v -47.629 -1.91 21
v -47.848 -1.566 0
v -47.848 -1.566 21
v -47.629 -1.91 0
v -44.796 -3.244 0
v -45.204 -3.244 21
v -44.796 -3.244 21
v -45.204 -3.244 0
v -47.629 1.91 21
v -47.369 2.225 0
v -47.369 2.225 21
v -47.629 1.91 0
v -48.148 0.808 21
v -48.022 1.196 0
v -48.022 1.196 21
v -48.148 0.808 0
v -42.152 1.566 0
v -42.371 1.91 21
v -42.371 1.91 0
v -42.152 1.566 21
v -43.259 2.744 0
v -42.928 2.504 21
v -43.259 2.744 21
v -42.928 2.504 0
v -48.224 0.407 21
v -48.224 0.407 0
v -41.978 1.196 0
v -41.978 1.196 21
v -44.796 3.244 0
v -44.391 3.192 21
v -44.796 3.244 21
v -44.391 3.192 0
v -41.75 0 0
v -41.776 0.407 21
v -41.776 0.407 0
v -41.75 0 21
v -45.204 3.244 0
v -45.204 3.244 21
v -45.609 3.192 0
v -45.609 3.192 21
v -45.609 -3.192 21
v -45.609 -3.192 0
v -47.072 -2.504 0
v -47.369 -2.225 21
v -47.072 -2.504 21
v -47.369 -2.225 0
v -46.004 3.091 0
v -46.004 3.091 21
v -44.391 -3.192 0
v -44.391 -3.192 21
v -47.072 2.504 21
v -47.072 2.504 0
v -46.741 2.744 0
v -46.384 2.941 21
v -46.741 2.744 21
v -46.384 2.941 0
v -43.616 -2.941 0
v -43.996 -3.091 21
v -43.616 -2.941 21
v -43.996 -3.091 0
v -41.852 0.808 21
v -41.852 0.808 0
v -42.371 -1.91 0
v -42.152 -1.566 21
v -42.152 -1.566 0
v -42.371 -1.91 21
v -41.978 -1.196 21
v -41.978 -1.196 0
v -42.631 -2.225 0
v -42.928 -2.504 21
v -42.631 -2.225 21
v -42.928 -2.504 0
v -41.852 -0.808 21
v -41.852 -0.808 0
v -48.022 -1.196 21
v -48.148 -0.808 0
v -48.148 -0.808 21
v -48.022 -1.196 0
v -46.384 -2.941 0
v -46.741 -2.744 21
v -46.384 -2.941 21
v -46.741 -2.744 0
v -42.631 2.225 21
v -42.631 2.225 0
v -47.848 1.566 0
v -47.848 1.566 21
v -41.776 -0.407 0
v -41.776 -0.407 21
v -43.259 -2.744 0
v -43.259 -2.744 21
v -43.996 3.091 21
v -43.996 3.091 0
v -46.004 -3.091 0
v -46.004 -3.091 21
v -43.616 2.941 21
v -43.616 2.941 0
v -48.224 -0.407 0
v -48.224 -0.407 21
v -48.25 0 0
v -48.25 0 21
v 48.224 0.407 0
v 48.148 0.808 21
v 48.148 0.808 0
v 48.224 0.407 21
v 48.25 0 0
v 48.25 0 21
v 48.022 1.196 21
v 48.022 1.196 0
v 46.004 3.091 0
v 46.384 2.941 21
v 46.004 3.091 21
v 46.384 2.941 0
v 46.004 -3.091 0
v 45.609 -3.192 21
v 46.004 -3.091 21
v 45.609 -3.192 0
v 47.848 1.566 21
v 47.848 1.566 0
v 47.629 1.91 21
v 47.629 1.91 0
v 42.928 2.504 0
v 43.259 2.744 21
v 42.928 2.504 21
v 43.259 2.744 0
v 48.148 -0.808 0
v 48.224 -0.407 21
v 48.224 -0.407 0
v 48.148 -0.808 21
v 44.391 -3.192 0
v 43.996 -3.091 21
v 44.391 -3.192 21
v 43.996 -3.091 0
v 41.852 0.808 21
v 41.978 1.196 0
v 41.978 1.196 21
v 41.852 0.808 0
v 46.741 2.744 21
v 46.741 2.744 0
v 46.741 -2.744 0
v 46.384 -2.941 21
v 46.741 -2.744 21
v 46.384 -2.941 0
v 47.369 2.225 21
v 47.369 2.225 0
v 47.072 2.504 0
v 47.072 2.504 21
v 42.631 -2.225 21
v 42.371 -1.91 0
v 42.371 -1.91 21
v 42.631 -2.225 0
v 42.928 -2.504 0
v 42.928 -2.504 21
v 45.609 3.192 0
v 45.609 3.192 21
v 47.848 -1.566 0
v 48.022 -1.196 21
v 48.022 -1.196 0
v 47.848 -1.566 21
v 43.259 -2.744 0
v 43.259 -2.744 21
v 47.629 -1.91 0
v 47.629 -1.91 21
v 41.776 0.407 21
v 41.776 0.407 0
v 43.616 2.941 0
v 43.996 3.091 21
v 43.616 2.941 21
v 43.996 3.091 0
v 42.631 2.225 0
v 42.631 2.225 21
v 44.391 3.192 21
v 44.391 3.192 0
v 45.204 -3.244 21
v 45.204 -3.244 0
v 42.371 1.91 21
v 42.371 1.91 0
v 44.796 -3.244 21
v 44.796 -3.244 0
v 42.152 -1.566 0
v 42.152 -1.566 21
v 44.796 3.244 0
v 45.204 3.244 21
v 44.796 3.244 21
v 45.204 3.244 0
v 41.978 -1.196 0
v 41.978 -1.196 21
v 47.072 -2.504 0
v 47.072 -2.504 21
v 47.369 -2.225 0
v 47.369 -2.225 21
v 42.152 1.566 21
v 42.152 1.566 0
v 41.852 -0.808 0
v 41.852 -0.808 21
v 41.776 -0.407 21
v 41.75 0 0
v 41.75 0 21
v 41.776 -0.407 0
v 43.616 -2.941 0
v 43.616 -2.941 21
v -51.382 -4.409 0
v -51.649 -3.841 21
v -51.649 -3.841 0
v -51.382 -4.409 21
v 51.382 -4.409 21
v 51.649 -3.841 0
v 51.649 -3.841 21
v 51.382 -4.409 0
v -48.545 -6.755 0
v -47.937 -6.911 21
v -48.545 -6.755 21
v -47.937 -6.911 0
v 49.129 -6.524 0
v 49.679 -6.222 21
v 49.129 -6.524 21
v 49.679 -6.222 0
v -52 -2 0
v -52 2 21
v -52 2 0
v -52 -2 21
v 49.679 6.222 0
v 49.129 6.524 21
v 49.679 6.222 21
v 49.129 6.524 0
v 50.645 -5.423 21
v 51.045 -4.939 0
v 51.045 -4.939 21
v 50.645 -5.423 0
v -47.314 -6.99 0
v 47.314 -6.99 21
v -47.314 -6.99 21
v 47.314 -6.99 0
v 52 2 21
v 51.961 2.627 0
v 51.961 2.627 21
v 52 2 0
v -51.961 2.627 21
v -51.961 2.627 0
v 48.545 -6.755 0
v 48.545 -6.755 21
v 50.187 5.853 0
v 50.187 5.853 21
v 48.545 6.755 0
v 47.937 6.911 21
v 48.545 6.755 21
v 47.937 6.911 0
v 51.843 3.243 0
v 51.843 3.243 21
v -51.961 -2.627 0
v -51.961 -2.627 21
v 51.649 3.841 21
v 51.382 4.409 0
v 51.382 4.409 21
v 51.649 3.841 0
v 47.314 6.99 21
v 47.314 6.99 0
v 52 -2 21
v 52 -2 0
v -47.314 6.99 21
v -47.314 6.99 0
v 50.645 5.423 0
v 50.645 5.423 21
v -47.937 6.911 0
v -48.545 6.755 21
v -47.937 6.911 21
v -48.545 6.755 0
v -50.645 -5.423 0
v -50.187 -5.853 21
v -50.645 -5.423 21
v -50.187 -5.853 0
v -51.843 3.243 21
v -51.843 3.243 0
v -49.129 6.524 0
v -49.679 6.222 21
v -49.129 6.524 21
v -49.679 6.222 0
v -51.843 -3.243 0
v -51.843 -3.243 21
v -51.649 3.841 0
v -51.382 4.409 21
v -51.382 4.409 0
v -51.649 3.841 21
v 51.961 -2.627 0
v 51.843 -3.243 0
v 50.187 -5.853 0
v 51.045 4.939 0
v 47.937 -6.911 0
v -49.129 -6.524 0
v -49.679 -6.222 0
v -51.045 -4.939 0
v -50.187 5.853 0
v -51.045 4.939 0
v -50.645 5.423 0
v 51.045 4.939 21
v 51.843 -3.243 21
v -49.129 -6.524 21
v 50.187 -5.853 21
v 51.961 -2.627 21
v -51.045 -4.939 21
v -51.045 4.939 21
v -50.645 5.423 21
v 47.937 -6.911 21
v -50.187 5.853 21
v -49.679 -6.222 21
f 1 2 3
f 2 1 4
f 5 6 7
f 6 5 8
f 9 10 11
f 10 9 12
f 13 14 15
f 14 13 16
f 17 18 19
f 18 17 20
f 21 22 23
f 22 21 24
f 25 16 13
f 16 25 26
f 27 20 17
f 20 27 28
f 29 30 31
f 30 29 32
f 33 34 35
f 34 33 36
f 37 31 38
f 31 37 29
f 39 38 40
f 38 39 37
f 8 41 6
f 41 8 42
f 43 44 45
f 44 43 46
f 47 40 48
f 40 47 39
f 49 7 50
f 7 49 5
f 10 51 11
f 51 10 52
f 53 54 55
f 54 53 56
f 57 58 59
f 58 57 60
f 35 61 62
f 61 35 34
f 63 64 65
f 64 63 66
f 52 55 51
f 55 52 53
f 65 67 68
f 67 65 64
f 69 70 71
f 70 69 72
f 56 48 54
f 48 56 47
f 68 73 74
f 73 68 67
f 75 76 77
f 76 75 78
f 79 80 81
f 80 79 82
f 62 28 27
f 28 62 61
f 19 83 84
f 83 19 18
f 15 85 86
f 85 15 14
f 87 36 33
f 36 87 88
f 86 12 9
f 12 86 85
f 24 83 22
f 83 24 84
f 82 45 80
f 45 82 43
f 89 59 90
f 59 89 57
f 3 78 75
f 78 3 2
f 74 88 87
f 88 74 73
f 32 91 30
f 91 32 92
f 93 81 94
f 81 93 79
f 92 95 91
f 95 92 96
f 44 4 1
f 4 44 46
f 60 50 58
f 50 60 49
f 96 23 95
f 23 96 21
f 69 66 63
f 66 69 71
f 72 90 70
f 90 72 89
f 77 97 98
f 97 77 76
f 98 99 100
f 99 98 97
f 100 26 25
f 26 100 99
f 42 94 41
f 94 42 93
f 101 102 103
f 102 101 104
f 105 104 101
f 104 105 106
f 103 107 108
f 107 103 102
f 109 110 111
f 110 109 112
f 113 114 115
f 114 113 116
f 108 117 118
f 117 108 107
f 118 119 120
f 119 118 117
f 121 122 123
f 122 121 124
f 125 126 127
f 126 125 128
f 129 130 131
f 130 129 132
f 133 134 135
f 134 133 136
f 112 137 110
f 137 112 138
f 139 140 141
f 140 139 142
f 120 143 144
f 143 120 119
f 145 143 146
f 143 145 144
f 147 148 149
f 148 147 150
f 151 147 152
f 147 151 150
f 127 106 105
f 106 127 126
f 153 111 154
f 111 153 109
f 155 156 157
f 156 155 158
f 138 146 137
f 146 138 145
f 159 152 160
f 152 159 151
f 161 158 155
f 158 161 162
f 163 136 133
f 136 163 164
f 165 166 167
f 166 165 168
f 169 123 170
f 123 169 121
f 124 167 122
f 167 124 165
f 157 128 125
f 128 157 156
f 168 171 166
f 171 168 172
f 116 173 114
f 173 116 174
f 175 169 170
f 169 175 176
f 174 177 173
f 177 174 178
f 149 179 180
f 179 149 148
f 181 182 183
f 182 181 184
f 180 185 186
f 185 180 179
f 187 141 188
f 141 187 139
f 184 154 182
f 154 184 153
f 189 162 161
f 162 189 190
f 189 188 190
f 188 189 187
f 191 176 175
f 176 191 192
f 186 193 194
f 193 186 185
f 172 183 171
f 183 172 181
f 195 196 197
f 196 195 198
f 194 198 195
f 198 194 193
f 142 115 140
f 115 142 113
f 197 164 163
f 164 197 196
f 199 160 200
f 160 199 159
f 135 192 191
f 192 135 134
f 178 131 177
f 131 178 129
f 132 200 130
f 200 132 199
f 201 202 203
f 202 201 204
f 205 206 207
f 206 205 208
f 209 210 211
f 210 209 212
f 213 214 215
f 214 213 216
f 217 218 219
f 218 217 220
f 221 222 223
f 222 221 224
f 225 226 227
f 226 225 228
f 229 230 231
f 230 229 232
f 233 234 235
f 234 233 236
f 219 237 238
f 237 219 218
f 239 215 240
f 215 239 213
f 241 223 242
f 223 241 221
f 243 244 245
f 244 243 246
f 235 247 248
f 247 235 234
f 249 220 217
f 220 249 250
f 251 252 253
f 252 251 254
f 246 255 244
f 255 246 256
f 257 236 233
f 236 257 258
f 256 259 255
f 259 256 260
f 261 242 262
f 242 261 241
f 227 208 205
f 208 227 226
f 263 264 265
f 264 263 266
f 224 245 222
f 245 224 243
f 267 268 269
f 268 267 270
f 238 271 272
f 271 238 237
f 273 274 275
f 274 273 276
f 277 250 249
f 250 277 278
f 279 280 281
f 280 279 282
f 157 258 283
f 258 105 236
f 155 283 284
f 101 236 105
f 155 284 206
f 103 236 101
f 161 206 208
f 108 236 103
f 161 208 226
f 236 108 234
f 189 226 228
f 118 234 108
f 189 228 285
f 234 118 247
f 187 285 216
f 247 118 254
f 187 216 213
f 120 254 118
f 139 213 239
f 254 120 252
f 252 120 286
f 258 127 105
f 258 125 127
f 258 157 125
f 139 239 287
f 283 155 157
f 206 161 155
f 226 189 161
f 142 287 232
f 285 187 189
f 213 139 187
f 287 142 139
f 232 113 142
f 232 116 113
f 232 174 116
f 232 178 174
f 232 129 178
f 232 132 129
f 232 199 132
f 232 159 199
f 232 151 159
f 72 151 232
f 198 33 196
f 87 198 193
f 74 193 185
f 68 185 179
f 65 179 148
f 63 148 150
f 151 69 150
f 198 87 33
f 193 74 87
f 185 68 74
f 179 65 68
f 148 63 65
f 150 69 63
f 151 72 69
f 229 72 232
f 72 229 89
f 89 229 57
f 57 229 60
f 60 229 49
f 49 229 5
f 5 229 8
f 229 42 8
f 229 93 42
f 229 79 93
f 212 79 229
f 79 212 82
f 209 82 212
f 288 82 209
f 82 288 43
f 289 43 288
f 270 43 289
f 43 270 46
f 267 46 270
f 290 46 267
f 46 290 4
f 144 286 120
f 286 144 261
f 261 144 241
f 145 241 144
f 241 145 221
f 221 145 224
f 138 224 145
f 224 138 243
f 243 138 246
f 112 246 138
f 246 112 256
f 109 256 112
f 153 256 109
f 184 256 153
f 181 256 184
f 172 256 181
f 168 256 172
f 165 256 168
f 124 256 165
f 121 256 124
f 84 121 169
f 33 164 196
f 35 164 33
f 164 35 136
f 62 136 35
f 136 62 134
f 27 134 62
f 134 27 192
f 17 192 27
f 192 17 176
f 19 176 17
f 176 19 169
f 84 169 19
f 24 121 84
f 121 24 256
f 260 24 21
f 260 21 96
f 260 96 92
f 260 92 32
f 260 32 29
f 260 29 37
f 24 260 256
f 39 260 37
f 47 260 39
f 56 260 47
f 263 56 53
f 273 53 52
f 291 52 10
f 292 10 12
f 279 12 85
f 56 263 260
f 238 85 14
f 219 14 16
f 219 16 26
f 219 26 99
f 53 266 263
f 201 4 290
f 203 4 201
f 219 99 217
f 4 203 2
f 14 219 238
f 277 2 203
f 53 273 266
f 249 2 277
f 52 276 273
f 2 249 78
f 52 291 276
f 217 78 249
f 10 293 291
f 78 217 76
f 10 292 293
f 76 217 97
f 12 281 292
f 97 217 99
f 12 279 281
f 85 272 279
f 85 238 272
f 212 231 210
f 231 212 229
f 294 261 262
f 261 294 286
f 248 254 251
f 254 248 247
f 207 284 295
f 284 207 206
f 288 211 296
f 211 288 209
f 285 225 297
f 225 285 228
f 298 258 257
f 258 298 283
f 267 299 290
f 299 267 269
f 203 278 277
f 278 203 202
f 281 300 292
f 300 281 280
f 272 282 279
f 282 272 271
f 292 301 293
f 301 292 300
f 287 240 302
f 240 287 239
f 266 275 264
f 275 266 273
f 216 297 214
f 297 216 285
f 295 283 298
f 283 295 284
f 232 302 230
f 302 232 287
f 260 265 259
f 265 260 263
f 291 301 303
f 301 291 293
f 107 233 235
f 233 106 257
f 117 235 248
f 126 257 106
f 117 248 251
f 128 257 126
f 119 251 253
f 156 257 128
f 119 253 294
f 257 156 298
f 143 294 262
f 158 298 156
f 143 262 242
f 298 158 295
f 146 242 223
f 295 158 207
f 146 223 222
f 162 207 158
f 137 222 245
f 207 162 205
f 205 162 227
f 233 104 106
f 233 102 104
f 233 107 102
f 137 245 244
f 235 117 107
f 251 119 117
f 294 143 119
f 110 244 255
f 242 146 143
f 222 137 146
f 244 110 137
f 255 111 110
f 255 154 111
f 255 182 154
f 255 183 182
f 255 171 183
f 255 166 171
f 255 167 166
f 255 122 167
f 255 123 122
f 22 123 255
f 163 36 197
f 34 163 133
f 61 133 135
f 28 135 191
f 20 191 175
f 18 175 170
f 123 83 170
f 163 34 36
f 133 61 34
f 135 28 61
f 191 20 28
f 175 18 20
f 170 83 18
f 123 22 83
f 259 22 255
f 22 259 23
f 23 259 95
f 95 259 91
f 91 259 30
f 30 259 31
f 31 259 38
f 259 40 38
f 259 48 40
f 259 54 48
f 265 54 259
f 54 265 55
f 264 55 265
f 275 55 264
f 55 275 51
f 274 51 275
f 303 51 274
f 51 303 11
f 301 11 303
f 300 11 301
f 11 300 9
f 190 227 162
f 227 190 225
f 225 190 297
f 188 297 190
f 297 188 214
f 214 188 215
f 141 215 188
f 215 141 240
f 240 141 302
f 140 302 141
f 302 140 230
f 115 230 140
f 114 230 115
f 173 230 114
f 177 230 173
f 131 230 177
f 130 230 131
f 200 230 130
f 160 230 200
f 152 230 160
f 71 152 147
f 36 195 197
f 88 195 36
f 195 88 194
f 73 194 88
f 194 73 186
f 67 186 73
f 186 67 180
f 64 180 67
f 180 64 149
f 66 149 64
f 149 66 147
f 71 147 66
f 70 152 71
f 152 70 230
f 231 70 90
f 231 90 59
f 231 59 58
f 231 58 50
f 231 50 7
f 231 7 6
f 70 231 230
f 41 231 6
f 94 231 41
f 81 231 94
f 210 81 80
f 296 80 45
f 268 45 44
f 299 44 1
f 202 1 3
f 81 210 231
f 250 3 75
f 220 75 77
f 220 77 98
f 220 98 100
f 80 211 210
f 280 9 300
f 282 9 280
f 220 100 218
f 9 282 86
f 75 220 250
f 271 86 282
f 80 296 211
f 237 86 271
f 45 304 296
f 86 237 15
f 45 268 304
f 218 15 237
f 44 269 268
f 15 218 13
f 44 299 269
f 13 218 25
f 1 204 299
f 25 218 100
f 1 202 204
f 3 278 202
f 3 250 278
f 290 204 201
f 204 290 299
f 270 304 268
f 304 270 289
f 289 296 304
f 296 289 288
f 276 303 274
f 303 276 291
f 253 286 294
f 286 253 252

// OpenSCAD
$fn = 50;


difference() {
	union() {
		hull() {
			translate(v = [-47.0000000000, 2.0000000000, 0]) {
				cylinder(h = 21, r = 5);
			}
			translate(v = [47.0000000000, 2.0000000000, 0]) {
				cylinder(h = 21, r = 5);
			}
			translate(v = [-47.0000000000, -2.0000000000, 0]) {
				cylinder(h = 21, r = 5);
			}
			translate(v = [47.0000000000, -2.0000000000, 0]) {
				cylinder(h = 21, r = 5);
			}
		}
	}
	union() {
		translate(v = [-45.0000000000, 0.0000000000, -100.0000000000]) {
			cylinder(h = 200, r = 3.2500000000);
		}
		translate(v = [-45.0000000000, 0.0000000000, -100.0000000000]) {
			cylinder(h = 200, r = 3.2500000000);
		}
		translate(v = [45.0000000000, 0.0000000000, -100.0000000000]) {
			cylinder(h = 200, r = 3.2500000000);
		}
		translate(v = [45.0000000000, 0.0000000000, -100.0000000000]) {
			cylinder(h = 200, r = 3.2500000000);
		}
	}
}
